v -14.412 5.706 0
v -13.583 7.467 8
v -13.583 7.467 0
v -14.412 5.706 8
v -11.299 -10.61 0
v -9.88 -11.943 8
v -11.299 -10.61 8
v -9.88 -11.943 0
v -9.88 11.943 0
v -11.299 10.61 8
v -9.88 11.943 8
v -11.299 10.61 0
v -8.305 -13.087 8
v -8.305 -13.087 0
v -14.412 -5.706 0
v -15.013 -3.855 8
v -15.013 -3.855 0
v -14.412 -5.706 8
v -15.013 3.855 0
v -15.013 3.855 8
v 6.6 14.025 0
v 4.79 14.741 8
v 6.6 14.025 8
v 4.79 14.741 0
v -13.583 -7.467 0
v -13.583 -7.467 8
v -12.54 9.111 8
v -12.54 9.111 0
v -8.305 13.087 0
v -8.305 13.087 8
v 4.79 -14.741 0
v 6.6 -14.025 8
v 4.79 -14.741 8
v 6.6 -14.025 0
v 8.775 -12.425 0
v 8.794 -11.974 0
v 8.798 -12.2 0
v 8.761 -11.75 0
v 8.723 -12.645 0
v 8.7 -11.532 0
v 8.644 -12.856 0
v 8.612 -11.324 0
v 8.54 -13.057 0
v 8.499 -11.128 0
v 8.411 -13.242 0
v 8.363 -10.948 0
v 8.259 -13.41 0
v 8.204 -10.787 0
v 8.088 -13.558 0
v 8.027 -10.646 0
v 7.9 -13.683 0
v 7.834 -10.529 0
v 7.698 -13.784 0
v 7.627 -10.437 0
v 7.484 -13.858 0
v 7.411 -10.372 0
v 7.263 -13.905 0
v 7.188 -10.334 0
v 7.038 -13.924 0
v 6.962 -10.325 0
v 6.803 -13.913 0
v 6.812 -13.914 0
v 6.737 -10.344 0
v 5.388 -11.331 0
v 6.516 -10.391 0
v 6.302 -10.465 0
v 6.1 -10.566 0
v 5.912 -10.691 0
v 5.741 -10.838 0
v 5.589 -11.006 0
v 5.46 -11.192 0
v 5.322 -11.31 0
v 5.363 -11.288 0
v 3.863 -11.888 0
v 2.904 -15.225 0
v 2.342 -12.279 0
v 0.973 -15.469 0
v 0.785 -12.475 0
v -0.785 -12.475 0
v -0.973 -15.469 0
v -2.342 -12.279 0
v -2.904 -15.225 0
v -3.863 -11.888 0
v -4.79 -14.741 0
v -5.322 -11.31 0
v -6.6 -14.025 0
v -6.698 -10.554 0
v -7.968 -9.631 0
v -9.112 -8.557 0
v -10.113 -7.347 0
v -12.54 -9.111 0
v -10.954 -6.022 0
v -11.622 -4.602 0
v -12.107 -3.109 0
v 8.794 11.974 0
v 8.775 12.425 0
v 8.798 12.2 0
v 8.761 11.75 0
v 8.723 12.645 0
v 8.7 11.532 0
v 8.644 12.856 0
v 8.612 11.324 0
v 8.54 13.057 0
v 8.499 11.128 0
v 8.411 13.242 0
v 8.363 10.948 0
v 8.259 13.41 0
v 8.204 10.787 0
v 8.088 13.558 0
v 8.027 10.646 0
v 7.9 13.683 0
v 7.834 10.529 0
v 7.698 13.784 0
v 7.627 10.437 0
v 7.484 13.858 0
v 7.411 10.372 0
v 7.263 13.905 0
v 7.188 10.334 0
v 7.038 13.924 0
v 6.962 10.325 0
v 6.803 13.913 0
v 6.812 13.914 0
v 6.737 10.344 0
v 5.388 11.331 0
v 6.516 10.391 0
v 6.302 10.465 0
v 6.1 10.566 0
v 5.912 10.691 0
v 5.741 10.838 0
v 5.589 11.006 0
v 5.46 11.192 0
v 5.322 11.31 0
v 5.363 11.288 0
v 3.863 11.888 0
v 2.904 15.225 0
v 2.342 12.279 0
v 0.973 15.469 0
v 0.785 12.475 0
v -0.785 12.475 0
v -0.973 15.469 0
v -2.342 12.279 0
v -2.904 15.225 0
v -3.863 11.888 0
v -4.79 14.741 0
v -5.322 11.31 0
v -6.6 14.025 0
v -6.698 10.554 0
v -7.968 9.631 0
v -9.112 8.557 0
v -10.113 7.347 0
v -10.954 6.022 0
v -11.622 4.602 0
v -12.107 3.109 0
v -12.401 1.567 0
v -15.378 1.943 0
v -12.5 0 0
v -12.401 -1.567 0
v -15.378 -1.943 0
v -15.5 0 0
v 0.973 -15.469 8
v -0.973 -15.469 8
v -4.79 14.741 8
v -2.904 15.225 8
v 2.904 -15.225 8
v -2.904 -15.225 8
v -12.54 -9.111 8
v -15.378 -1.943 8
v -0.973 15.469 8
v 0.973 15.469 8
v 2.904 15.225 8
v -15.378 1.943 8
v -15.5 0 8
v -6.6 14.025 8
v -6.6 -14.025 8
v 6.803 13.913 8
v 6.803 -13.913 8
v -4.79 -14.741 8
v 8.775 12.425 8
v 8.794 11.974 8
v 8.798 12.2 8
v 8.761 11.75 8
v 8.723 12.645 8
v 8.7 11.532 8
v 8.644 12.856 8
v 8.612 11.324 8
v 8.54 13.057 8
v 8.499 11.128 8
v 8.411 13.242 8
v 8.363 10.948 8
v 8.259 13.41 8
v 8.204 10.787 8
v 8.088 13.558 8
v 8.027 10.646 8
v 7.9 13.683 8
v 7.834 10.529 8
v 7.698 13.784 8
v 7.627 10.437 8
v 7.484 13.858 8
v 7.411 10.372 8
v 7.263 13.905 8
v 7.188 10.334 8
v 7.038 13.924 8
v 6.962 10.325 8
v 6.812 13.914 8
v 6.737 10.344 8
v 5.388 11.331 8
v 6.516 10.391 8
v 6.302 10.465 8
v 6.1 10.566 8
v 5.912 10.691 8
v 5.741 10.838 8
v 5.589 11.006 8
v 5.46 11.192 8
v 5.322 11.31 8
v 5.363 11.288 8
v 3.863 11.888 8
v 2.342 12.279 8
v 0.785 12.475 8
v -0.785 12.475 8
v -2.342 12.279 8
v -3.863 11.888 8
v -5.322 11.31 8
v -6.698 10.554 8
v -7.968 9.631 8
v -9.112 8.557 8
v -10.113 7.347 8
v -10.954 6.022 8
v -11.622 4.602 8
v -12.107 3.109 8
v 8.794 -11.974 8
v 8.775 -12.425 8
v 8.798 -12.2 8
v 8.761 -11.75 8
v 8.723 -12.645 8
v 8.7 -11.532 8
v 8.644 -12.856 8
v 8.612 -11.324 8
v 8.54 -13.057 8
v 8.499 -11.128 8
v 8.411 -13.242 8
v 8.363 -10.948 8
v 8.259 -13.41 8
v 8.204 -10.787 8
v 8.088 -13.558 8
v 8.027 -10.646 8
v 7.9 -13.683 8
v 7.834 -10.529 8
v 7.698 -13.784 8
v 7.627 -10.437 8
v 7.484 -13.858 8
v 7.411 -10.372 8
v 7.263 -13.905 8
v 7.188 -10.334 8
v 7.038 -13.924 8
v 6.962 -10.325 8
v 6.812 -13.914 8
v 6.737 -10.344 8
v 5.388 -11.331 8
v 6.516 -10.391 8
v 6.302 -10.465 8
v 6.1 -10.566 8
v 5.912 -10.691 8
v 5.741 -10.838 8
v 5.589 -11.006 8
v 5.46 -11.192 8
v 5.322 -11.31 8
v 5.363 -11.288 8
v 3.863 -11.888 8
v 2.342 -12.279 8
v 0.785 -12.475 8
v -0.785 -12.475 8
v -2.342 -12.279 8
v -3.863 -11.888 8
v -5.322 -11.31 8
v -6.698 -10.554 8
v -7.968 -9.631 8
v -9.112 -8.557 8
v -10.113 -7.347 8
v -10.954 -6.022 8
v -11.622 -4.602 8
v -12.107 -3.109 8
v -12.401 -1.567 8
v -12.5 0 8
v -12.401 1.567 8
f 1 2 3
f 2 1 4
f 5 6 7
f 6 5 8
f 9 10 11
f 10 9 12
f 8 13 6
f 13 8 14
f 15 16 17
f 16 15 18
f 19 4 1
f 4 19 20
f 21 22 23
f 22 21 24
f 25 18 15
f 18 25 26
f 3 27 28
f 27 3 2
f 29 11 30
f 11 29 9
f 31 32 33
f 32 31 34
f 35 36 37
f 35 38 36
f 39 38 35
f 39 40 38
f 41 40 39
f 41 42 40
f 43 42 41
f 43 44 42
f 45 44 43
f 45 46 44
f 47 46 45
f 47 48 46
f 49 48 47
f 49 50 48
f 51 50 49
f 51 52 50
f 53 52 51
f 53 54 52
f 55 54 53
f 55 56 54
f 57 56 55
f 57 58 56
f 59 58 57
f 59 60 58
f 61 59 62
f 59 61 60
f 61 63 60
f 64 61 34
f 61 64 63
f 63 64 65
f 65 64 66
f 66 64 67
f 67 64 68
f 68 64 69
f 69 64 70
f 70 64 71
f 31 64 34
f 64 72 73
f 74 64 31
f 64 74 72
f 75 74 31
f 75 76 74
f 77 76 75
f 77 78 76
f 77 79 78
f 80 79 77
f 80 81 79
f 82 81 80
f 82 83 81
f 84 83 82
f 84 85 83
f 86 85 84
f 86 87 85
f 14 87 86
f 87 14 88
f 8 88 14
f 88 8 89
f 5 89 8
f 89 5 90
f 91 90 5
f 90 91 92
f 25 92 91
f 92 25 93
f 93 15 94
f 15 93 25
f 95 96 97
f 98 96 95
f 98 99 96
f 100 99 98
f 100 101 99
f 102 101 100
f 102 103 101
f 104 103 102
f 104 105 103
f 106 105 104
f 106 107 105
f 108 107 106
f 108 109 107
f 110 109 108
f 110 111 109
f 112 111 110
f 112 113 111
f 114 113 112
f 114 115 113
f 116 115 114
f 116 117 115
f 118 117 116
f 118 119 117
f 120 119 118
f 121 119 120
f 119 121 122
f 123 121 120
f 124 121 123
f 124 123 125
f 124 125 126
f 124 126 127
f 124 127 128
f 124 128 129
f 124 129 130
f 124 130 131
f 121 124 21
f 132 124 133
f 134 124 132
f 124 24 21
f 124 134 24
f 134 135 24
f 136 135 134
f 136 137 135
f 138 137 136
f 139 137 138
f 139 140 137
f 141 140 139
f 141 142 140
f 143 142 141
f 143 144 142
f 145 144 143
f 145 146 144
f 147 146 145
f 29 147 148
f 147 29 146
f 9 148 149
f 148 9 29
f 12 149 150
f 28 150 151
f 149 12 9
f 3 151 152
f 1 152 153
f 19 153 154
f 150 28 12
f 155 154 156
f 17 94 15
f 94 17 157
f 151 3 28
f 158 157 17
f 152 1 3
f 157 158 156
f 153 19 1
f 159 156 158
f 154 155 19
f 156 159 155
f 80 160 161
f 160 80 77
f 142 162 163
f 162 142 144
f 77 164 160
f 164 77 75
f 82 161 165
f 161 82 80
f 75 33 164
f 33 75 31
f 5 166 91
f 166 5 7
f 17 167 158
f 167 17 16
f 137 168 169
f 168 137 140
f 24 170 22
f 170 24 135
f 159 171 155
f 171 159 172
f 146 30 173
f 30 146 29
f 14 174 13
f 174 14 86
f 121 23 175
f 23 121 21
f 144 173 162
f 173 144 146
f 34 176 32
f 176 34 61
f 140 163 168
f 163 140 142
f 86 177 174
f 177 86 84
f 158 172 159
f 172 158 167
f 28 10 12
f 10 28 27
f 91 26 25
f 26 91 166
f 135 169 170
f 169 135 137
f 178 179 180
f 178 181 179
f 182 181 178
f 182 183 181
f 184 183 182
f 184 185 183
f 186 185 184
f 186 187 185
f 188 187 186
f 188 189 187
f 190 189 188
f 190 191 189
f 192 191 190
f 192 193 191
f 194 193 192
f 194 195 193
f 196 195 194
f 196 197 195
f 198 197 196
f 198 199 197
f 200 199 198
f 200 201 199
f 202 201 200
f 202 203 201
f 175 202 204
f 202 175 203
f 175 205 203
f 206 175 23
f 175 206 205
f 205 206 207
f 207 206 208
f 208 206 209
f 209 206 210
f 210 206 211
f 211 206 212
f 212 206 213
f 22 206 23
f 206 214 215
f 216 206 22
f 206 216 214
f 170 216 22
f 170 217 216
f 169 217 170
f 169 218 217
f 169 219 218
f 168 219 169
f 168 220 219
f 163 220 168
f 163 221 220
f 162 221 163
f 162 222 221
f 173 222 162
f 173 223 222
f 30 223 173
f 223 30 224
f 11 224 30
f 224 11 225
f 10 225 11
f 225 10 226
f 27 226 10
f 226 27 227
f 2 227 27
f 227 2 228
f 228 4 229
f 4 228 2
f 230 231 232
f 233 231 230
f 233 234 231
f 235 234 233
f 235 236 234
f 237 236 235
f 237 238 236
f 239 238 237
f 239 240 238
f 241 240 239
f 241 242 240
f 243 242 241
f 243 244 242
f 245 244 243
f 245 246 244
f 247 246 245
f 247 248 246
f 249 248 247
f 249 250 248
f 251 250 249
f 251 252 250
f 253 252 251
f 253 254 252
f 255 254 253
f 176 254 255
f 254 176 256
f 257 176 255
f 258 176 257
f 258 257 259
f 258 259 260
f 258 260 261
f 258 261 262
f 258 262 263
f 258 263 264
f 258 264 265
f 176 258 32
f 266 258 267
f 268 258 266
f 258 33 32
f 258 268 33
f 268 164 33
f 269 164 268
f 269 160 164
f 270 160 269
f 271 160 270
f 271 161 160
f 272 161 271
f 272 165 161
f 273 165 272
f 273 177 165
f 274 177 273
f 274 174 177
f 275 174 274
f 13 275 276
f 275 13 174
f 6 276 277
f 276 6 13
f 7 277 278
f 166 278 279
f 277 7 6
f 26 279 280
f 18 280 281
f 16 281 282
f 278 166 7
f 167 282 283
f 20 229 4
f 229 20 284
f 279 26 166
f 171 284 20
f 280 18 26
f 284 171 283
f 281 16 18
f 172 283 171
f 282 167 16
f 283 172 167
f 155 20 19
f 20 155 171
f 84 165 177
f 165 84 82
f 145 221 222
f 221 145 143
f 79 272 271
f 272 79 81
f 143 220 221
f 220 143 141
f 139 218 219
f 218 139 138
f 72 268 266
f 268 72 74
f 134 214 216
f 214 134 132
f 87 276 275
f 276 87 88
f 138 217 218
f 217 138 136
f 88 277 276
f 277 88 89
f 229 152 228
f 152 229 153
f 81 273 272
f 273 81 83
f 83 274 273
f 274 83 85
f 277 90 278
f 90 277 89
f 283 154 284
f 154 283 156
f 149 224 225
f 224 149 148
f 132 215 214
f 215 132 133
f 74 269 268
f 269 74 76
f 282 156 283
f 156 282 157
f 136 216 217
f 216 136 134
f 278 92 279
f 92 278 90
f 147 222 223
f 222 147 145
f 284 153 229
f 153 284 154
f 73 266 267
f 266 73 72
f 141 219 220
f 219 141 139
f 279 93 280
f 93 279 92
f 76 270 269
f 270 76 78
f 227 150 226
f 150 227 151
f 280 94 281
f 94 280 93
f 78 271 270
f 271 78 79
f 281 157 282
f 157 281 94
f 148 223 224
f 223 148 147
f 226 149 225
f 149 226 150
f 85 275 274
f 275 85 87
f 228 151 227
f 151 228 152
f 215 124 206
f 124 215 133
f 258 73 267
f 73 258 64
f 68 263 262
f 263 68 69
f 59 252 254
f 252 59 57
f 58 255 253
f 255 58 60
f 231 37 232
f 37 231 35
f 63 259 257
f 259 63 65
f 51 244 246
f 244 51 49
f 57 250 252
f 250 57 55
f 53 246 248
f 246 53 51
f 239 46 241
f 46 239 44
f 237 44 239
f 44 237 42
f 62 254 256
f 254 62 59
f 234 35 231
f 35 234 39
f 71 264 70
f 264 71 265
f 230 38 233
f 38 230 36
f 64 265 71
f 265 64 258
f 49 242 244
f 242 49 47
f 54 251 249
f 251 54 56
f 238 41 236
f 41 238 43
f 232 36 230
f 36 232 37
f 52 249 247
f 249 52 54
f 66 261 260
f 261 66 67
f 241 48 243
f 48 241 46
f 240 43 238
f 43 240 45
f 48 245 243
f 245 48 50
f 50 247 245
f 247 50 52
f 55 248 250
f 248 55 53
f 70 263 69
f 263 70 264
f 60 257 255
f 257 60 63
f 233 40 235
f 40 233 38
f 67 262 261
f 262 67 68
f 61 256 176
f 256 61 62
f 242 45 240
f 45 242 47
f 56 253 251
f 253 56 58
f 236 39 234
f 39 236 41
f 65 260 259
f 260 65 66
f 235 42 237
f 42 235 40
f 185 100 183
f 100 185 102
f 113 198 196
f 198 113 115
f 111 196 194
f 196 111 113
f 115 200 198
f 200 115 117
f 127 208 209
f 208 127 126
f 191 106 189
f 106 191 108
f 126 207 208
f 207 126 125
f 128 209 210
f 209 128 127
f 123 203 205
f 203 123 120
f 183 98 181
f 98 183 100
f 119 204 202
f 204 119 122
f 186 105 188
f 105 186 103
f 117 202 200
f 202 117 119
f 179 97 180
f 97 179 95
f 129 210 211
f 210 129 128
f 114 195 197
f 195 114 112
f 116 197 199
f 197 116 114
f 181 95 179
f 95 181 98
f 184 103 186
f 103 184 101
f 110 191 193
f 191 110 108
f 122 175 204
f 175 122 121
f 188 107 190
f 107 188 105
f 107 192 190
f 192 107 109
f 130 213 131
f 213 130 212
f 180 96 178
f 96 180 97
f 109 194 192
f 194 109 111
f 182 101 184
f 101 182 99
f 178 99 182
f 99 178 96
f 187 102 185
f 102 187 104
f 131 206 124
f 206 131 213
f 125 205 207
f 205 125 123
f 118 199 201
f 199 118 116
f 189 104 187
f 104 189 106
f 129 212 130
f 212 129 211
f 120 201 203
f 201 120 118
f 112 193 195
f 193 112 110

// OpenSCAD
D_internal=25;//[8:0.1:50]
thickness=3;//[3:0.5:10]
H_clamp=8;//[5:0.5:20]
angle=60;//[30:5:80]


/* [Hidden] */
R_internal=D_internal/2;

Rext=R_internal+thickness;
radius_cylinder=thickness/2 + thickness/10;

H_clamp=8;
//25,16,19,22
$fn=50;

difference()
{
    cylinder(r=Rext,h=H_clamp);
    translate ([0,0,-0.5])    cylinder(r=R_internal,H_clamp+1);
    hull()
    {
        rotate([0,0,0])translate ([0,0,-0.5]) cylinder(r=1,h=H_clamp+1);
        rotate([0,0,angle])translate ([(R_internal+thickness)*20,0,-0.5]) cylinder(r=1,h=H_clamp+1);
        rotate([0,0,-angle])translate ([(R_internal+thickness)*20,0,-0.5]) cylinder(r=1,h=H_clamp+1);
    }
}

rotate([0,0,-angle])translate ([R_internal+thickness/2,0,0]) cylinder(r=radius_cylinder,h=H_clamp);
rotate([0,0,+angle])translate ([R_internal+thickness/2,0,0]) cylinder(r=radius_cylinder,h=H_clamp);
